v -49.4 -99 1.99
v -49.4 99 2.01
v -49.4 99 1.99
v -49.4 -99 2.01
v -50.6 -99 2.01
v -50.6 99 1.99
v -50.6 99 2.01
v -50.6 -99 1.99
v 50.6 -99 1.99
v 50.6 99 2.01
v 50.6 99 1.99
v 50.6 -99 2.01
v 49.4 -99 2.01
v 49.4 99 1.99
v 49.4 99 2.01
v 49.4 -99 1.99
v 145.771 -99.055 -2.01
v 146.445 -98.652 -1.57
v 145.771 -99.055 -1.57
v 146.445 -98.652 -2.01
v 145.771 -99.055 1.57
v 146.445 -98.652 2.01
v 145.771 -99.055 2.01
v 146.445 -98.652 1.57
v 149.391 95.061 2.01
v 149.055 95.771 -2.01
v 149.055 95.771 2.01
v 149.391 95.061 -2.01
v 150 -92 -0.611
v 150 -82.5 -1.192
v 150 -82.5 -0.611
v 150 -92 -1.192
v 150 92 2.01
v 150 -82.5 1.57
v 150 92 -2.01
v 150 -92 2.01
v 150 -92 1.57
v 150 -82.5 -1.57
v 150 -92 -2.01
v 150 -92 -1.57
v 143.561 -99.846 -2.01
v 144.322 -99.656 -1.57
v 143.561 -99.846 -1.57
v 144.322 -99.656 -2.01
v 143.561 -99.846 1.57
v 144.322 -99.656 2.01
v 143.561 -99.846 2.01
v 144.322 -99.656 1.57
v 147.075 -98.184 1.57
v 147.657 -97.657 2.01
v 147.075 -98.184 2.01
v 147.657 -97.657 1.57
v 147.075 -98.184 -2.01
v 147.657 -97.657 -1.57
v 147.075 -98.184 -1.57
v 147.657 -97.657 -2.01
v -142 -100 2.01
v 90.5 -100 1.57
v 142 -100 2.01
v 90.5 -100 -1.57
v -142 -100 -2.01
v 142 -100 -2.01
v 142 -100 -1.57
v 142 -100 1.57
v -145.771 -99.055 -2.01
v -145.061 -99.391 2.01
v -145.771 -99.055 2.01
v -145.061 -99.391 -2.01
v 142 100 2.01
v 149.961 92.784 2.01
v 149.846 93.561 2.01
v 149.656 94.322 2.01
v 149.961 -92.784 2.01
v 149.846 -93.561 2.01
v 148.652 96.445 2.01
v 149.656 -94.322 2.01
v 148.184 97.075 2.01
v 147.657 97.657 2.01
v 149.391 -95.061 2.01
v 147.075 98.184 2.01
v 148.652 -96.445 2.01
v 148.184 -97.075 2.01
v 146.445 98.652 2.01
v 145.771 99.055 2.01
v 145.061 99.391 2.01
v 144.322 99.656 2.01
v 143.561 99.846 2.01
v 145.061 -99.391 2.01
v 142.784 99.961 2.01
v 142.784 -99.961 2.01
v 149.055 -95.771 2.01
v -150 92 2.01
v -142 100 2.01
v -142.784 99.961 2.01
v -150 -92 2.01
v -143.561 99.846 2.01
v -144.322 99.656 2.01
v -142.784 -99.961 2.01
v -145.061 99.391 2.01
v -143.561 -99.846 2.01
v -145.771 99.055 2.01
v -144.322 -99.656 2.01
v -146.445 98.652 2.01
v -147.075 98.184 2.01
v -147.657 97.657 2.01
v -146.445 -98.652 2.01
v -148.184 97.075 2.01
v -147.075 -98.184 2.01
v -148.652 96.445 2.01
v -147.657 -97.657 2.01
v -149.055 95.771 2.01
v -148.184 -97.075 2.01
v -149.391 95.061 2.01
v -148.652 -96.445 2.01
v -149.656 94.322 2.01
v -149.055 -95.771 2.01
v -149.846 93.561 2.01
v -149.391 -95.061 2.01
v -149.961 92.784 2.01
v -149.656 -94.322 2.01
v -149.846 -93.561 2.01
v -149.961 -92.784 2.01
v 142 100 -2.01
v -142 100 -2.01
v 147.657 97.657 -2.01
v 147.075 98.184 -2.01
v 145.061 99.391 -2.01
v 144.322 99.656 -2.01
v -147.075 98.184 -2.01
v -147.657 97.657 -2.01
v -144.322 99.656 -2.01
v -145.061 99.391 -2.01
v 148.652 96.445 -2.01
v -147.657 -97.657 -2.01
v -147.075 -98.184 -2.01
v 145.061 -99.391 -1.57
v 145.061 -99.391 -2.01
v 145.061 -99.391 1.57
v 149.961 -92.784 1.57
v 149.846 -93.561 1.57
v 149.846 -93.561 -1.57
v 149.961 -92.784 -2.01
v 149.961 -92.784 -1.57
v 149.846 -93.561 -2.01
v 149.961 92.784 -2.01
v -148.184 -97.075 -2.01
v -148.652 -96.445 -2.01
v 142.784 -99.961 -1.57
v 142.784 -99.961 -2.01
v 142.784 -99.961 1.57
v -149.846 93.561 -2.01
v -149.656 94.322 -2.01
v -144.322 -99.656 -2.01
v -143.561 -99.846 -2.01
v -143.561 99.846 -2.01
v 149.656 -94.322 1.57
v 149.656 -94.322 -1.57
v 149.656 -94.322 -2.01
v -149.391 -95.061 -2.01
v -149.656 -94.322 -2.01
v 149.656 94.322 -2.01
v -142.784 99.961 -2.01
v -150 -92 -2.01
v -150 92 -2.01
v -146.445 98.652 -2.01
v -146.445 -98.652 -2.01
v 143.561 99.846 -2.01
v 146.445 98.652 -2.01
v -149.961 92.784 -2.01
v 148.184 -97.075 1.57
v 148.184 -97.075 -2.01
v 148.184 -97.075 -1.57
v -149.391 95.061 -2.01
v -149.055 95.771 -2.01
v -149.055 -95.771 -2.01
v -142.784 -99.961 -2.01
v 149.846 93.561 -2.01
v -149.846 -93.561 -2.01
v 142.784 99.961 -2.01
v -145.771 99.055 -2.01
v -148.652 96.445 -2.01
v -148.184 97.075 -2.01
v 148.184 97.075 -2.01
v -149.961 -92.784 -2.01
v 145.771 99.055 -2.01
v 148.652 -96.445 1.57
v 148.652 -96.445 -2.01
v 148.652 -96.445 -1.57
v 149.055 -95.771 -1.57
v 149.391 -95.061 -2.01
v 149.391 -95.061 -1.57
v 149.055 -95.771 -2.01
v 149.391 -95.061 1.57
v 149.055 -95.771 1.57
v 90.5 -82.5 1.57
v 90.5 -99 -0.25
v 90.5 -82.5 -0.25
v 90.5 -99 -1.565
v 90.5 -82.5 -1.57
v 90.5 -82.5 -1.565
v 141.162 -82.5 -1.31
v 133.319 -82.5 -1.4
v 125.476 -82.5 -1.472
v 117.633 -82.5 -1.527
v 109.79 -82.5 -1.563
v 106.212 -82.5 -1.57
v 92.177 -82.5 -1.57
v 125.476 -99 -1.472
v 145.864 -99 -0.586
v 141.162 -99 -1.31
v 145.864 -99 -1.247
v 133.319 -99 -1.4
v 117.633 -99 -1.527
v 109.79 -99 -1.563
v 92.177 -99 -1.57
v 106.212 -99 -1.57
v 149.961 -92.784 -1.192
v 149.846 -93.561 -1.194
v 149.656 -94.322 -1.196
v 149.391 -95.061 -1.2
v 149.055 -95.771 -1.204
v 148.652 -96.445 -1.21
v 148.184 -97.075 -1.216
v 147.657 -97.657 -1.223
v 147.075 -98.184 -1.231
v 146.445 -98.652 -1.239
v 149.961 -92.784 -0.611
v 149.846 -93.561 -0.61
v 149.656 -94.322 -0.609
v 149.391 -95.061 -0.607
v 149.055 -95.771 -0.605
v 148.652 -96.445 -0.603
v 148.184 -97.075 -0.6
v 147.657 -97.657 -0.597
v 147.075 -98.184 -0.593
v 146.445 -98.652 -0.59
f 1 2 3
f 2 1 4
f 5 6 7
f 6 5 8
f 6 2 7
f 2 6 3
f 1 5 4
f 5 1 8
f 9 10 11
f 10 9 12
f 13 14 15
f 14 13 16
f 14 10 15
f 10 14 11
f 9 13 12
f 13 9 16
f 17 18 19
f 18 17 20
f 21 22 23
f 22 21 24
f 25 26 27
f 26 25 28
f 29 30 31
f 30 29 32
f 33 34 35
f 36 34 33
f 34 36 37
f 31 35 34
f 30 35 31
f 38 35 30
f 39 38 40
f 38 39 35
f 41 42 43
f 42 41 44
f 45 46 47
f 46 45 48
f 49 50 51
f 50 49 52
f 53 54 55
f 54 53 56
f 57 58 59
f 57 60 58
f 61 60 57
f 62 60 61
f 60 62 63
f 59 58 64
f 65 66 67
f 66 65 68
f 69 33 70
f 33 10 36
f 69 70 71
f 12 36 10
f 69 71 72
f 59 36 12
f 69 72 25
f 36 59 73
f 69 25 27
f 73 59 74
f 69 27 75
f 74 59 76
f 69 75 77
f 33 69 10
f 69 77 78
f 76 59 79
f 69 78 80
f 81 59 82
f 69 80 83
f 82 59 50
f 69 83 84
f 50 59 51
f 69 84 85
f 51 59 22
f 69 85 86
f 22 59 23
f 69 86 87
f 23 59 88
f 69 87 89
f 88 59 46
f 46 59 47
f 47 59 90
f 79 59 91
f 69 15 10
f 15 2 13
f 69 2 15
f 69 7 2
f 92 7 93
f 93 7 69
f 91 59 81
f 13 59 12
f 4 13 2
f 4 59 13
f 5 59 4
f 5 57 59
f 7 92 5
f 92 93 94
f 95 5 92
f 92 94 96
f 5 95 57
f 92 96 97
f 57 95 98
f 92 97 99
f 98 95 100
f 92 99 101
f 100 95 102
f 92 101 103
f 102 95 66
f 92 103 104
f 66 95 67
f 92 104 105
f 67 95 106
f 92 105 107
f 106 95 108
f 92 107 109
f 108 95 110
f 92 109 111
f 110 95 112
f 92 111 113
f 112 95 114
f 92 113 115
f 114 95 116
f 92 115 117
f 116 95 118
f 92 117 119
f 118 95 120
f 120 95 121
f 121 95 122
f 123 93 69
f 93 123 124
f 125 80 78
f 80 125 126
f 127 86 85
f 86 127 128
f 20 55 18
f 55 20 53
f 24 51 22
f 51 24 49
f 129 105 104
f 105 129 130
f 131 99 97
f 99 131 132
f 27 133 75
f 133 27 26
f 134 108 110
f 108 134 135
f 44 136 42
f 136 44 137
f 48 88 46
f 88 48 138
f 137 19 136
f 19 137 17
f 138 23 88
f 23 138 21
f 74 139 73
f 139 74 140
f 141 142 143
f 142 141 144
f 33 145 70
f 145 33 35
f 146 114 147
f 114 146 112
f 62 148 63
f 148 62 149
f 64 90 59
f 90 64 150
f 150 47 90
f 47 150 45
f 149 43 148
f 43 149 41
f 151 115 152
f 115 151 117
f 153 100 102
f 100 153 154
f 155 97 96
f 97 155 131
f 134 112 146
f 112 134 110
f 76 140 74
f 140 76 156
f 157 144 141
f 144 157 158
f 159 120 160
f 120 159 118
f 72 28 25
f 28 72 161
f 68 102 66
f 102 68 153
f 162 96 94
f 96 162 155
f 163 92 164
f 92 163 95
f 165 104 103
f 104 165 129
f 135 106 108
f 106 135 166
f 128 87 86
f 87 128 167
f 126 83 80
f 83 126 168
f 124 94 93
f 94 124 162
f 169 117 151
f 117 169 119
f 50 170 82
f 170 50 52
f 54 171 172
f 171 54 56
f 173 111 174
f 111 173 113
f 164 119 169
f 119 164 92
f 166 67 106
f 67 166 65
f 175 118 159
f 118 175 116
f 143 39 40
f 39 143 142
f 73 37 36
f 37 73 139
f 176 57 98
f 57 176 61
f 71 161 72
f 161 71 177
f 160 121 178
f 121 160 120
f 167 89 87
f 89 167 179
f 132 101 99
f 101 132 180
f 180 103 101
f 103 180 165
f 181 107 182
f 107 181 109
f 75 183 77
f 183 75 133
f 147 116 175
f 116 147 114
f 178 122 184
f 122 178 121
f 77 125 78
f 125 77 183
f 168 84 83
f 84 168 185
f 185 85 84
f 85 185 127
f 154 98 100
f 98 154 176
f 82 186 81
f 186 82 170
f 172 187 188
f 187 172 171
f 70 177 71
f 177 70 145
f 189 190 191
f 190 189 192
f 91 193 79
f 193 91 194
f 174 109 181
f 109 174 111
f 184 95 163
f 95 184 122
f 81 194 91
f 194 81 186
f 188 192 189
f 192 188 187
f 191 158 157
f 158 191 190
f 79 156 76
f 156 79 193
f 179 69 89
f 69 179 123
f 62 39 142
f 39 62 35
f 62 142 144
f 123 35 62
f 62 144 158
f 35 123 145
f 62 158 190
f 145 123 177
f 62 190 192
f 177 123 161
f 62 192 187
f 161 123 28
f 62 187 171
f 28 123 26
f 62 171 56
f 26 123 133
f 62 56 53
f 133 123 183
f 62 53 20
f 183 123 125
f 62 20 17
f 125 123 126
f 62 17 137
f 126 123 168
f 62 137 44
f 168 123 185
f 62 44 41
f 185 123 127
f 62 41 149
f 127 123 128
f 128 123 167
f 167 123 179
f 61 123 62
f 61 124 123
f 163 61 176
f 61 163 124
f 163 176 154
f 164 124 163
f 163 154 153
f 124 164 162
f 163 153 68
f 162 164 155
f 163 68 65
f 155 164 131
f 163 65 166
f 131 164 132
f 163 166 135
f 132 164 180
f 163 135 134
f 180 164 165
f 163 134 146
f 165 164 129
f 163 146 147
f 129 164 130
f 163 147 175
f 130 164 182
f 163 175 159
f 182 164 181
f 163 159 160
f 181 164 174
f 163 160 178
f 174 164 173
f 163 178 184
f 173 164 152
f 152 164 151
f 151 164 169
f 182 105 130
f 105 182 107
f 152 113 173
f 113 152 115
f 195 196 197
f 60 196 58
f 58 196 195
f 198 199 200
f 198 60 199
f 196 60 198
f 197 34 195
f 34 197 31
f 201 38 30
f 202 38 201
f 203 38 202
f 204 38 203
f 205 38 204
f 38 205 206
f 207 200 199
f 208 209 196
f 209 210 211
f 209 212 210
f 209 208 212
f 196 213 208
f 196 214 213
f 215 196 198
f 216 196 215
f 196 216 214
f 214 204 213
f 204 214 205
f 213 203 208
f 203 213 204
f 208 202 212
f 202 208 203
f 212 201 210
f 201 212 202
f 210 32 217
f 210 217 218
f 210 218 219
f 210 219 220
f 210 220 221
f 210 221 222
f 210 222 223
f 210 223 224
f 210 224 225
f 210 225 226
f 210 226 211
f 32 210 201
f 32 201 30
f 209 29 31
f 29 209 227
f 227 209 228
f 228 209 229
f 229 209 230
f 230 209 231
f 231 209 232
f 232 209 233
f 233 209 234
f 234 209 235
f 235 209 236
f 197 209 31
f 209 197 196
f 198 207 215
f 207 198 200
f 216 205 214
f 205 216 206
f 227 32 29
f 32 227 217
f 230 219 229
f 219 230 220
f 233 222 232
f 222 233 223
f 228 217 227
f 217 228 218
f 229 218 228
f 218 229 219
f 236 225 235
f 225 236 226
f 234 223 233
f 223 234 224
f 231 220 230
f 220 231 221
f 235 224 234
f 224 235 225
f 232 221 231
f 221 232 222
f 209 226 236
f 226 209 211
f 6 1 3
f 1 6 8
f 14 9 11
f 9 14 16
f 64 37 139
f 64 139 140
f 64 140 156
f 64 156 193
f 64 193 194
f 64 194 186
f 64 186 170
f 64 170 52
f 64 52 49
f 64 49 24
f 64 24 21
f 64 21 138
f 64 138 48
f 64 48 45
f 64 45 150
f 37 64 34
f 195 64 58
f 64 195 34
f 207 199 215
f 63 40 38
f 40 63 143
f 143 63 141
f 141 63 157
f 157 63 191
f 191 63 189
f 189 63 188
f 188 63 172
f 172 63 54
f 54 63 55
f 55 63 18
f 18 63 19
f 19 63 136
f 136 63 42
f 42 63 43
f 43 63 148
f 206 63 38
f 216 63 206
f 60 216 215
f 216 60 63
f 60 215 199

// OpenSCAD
// Corrugated cardboard sheet (single connected solid) - FIXED: non-empty, real thickness, visible corrugation

$fn = 64;

// Parameters
sheet_L = 300; //[150:600:1]
sheet_W = 200; //[100:400:1]
sheet_T = 4;   //[2:8:0.1]

liner_T = 0.4; //[0.2:1:0.05]

corrugation_pitch = 8;    //[4:16:0.5]
corrugation_amp   = 1.5;  //[0.5:3:0.1]
corrugation_wall_T = 0.6; //[0.3:1.2:0.05]

corner_R = 8; //[2:20:0.5]

edge_cut_L = 60;      //[20:120:1]
edge_cut_depth = 18;  //[6:60:1]
edge_cut_Z = 3.2;     //[1:6:0.1]
edge_cut_Z_offset = 0; //[-1:1:0.1]

fold_count = 2; //[0:4:1]
crease_W = 1.2; //[0.6:3:0.1]
crease_depth = 0.25; //[0.1:0.8:0.05]

grain_depth = 0.12; //[0.05:0.3:0.01]
grain_pitch = 10;   //[6:20:1]

overlap = 1; //[0.5:2:0.1]

// Robust epsilons
eps = 0.02;
minT = 0.2;

// Derived
sheet_T_eff = max(sheet_T, 2*liner_T + minT);
liner_T_eff = min(liner_T, sheet_T_eff/2 - minT/2);
core_T = max(minT, sheet_T_eff - 2*liner_T_eff);

core_z0 = -sheet_T_eff/2 + liner_T_eff;
core_z1 =  sheet_T_eff/2 - liner_T_eff;
core_zc = (core_z0 + core_z1)/2;

// Clamp corrugation amplitude so it fits inside core
amp_eff = min(corrugation_amp, max(0.05, core_T/2 - corrugation_wall_T/2 - eps));

// Base Shapes
module rounded_rect_prism(L, W, T, R) {
  R2 = min(R, min(L, W)/2 - eps);
  minkowski() {
    cube([max(eps, L-2*R2), max(eps, W-2*R2), max(eps, T)], center=true);
    cylinder(r=R2, h=eps, center=true);
  }
}

module sheet_solid() {
  rounded_rect_prism(sheet_L, sheet_W, sheet_T_eff, corner_R);
}

module liner_top() {
  translate([0, 0, sheet_T_eff/2 - liner_T_eff/2])
    rounded_rect_prism(sheet_L, sheet_W, liner_T_eff, corner_R);
}

module liner_bottom() {
  translate([0, 0, -sheet_T_eff/2 + liner_T_eff/2])
    rounded_rect_prism(sheet_L, sheet_W, liner_T_eff, corner_R);
}

// Corrugation: build a wavy "web" in XZ, then extrude along Y
module corrugation_web_2d(len, pitch, amp, wallT) {
  n = max(8, ceil(len / max(0.1, pitch)));
  step = len / n;

  pts = [ for (i=[0:n]) [
            -len/2 + i*step,
            amp * sin(360 * (-len/2 + i*step) / max(0.1, pitch))
         ] ];

  // Thickened path: offset a polyline (use offset on polygon made from the polyline)
  offset(delta=wallT/2, join_type="round")
    polygon(points=pts);
}

module corrugated_core() {
  // Extrude the web along Y, then clip to the core volume and rounded outline
  intersection() {
    // Web spans full width; centered in Z within core
    translate([0, 0, core_zc])
      rotate([90, 0, 0])  // linear_extrude along Z becomes along Y
        linear_extrude(height=max(eps, sheet_W - 2*overlap), center=true, convexity=10)
          corrugation_web_2d(max(eps, sheet_L - 2*overlap), corrugation_pitch, amp_eff, corrugation_wall_T);

    // Clip to the core volume (between liners) and rounded outline
    translate([0, 0, core_zc])
      rounded_rect_prism(sheet_L, sheet_W, core_T, corner_R);
  }
}

module edge_exposure_cutaway() {
  // Cut from one corner/edge; ensure it intersects the sheet
  translate([
      sheet_L/2 - edge_cut_L/2 + overlap*0.5,
     -sheet_W/2 + edge_cut_depth/2 - overlap*0.5,
      edge_cut_Z_offset
    ])
    cube([edge_cut_L, edge_cut_depth, edge_cut_Z], center=true);
}

module crease_line_at(xpos) {
  translate([xpos, 0, sheet_T_eff/2 - crease_depth/2 + overlap*0.2])
    cube([crease_W, sheet_W - 2*overlap, crease_depth], center=true);
}

module creases_union() {
  if (fold_count <= 0) {
    // none
  } else if (fold_count == 1) {
    crease_line_at(0);
  } else {
    for (k = [0:fold_count-1]) {
      x = (k - (fold_count-1)/2) * (sheet_L/(fold_count+1));
      crease_line_at(x);
    }
  }
}

module grain_grooves_union() {
  // shallow grooves on top liner area
  count = ceil(sheet_W / grain_pitch);
  for (i = [-count:count]) {
    translate([0, i*grain_pitch, sheet_T_eff/2 - grain_depth/2 + overlap*0.2])
      cube([sheet_L - 2*overlap, grain_pitch/3, grain_depth], center=true);
  }
}

module sheet_with_surface_details() {
  difference() {
    sheet_solid();
    edge_exposure_cutaway();
    creases_union();
    grain_grooves_union();
  }
}

// Final Output: ONE connected solid (liners overlap into sheet; core intersects liners)
module cardboard_sheet_complete() {
  union() {
    sheet_with_surface_details();

    // Overlap liners slightly into the core to guarantee connectivity
    translate([0, 0, -eps]) liner_top();
    translate([0, 0,  eps]) liner_bottom();

    // Core intersects liners by construction (core thickness spans between liners)
    corrugated_core();
  }
}

cardboard_sheet_complete();
